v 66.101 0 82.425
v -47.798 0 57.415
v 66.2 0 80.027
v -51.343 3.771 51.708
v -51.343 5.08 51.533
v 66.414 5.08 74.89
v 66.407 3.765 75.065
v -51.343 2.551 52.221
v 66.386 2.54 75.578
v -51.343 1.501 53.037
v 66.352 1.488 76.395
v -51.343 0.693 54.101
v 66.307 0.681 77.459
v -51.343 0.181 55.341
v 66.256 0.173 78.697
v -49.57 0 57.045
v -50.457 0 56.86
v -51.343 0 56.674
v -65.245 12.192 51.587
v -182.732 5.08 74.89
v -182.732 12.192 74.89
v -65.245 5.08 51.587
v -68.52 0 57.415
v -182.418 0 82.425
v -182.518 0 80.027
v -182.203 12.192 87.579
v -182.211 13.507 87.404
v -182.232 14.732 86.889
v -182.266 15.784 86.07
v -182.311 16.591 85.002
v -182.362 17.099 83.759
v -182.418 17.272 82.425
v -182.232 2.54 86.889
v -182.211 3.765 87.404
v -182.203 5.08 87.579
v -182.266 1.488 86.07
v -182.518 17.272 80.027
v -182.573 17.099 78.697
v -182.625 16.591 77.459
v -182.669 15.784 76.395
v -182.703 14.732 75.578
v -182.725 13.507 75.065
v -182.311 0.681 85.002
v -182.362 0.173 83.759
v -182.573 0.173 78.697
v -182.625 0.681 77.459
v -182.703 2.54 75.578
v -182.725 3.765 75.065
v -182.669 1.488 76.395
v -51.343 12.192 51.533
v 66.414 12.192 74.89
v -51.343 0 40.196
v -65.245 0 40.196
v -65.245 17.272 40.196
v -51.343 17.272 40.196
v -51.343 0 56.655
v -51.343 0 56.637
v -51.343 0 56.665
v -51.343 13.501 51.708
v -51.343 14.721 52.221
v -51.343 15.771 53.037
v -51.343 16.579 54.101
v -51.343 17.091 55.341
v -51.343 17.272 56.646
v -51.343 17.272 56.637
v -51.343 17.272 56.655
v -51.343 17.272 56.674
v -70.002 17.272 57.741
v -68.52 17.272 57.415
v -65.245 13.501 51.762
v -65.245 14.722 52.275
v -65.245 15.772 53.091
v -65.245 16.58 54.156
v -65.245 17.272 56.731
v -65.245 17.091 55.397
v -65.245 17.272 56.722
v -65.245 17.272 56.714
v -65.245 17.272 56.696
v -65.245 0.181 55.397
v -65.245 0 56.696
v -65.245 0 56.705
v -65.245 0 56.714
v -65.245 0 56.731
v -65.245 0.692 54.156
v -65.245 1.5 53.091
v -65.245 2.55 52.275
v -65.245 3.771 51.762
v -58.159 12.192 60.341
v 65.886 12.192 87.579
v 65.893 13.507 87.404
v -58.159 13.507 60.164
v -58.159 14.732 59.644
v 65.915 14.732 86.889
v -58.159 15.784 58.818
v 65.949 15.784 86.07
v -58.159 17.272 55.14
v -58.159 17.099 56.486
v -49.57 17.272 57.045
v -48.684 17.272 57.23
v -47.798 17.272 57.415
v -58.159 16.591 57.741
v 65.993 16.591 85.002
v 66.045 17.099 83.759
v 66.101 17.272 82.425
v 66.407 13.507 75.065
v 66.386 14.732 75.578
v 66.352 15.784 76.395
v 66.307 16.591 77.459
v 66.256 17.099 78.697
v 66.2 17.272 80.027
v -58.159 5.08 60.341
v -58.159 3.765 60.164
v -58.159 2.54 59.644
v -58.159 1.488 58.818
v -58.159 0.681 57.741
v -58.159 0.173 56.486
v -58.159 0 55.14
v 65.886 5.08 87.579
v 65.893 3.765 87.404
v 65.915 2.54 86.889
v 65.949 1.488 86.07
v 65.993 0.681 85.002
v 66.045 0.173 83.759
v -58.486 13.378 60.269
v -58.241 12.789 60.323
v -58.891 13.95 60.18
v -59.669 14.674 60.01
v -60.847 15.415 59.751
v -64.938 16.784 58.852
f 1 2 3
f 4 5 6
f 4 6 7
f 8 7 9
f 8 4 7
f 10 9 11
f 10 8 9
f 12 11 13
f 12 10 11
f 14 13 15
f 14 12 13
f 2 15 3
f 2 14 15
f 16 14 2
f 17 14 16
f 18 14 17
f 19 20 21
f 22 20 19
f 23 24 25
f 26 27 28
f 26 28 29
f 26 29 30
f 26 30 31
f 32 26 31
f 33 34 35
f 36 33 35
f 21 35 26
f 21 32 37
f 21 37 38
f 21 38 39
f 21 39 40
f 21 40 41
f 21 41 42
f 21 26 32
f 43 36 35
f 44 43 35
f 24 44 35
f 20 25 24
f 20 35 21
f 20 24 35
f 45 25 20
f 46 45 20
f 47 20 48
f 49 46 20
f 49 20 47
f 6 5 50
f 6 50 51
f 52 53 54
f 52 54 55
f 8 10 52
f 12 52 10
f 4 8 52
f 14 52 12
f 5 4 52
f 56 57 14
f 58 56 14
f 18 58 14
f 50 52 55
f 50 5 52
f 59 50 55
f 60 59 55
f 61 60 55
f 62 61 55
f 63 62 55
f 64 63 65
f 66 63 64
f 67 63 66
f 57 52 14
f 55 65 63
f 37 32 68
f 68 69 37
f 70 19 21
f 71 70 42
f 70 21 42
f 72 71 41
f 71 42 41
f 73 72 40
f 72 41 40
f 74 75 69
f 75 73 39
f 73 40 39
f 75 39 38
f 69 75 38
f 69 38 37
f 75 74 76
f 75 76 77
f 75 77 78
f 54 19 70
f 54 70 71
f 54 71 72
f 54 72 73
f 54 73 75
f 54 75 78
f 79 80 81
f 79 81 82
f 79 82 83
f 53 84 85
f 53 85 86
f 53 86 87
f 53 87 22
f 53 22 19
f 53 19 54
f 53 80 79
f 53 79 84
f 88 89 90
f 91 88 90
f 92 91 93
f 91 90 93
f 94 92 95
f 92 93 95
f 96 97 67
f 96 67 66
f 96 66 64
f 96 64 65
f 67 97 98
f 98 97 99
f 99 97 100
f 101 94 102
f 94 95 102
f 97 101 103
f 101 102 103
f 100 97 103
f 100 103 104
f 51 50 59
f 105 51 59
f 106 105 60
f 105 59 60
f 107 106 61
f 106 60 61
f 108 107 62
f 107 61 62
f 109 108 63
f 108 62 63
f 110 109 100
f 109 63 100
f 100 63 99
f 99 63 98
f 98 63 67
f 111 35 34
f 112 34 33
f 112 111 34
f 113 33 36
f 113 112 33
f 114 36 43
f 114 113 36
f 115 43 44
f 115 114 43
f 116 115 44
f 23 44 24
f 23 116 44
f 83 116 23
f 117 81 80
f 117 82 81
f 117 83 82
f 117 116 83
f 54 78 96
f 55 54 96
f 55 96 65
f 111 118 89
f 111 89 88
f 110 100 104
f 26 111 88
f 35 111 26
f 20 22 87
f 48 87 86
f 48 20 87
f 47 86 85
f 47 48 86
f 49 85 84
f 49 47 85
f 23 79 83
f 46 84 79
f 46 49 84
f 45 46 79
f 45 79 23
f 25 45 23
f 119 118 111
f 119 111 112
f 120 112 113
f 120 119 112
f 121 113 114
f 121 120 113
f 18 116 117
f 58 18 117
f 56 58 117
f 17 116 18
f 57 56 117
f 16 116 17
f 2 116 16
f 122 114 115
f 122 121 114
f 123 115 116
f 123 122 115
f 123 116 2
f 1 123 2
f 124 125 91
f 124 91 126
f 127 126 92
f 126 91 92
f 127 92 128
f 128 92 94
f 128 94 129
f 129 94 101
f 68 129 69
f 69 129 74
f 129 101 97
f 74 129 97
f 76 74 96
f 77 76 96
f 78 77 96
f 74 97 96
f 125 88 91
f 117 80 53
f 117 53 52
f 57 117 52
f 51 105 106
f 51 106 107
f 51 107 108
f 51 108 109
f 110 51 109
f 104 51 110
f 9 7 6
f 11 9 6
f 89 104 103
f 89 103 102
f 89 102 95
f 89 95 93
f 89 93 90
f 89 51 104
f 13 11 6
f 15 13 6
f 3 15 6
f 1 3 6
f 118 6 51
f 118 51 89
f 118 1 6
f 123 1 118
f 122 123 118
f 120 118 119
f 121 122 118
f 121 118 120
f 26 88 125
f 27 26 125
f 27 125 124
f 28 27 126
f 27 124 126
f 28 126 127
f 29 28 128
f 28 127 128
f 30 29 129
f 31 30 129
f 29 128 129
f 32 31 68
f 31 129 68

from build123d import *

# Parameters (mm, degrees)
F1_DEPTH     = 17.272
F2_T4_DEPTH  = 145.1755034497
F2_T9_DEPTH  = 145.1755034497
F2_T14_DEPTH = 145.451805042
F2_T19_DEPTH = 145.451805042
F2_T24_DEPTH = 152.4
F2_T29_DEPTH = 152.4
F2_T34_DEPTH = 152.4
F2_T39_DEPTH = 152.4
F2_T45_DEPTH = 152.4
F2_T49_DEPTH = 152.4
F2_T56_DEPTH = 152.4
F2_T60_DEPTH = 152.4


# Not quite as in the source:
# - a fillet or chamfer that OpenCascade refuses, or shapes differently, is made with other operations: its cross-section is extruded or revolved along the edge and cut away or added


with BuildPart() as f1:
    # F0 (on Front) → F1 (new body)
    with BuildSketch(Plane.XZ):
        Polygon((-58.1587258462, 60.3411067049), (-182.2034080142, 87.5792568958), (-182.731828862, 74.8902549096), (-65.2451664209, 51.5867063582), (-65.2451664209, 57.4221499264), (-51.3433068991, 57.4221499264), (-51.3433068991, 51.5329490591), (66.4143771697, 74.8902549096), (65.8859563219, 87.5792568958), align=None)
        Polygon((-65.2451664209, 57.4221499264), (-65.2451664209, 51.5867063582), (-58.1587258462, 50.1811067049), (-51.3433068991, 51.5329490591), (-51.3433068991, 57.4221499264), align=None)
        Polygon((-58.1587258462, 50.1811067049), (-65.2451664209, 51.5867063582), (-65.2451664209, 40.1959307492), (-51.3433068991, 40.1959307492), (-51.3433068991, 51.5329490591), align=None)
    extrude(amount=-F1_DEPTH)

    # F2: fillet of radius 5.08 on 8 edges, made by hand


with BuildPart() as f2_tool2:
    # F2_s3 → F2_t4 (new body)
    with BuildSketch(Plane(origin=(-202.5642945881, 0, 40.1787468945), x_dir=(0, 1, 0), z_dir=(0.9808905749, 0, -0.1945602221))):
        with BuildLine():
            ThreePointArc((12.192, 37.9067999896), (15.7841024484, 39.3946975412), (17.272, 42.9867999896))
            Line((17.272, 42.9867999896), (17.272, 37.9067999896))
            Line((17.272, 37.9067999896), (12.192, 37.9067999896))
        make_face()
    extrude(amount=F2_T4_DEPTH)

    split(bisect_by=Plane.YZ.offset(-65.2451664209), keep=Keep.BOTTOM)


with BuildPart() as f1_1:
    add(f1.part)

    # F2_t1: cut F2_tool2
    add(f2_tool2.part, mode=Mode.SUBTRACT)


with BuildPart() as f2_tool7:
    # F2_s8 → F2_t9 (new body)
    with BuildSketch(Plane(origin=(-202.5642945881, 0, 40.1787468945), x_dir=(0, 1, 0), z_dir=(0.9808905749, 0, -0.1945602221))):
        with BuildLine():
            ThreePointArc((5.08, 37.9067999896), (1.4878975516, 39.3946975412), (0, 42.9867999896))
            Line((0, 42.9867999896), (0, 37.9067999896))
            Line((0, 37.9067999896), (5.08, 37.9067999896))
        make_face()
    extrude(amount=F2_T9_DEPTH)

    split(bisect_by=Plane.YZ.offset(-65.2451664209), keep=Keep.BOTTOM)


with BuildPart() as f1_2:
    add(f1_1.part)

    # F2_t6: cut F2_tool7
    add(f2_tool7.part, mode=Mode.SUBTRACT)


with BuildPart() as f2_tool12:
    # F2_s13 → F2_t14 (new body)
    with BuildSketch(Plane(origin=(-52.0224181794, 0, -10.3186772236), x_dir=(0, 1, 0), z_dir=(0.9808905749, 0, 0.1945602221))):
        with BuildLine():
            ThreePointArc((12.192, 60.5375492231), (15.7841024484, 62.0254467746), (17.272, 65.6175492231))
            Line((17.272, 65.6175492231), (17.272, 60.5375492231))
            Line((17.272, 60.5375492231), (12.192, 60.5375492231))
        make_face()
    extrude(amount=F2_T14_DEPTH)

    split(bisect_by=Plane.YZ.offset(-51.3433068991), keep=Keep.TOP)


with BuildPart() as f1_3:
    add(f1_2.part)

    # F2_t11: cut F2_tool12
    add(f2_tool12.part, mode=Mode.SUBTRACT)


with BuildPart() as f2_tool17:
    # F2_s18 → F2_t19 (new body)
    with BuildSketch(Plane(origin=(-52.0224181794, 0, -10.3186772236), x_dir=(0, 1, 0), z_dir=(0.9808905749, 0, 0.1945602221))):
        with BuildLine():
            ThreePointArc((5.08, 60.5375492231), (1.4878975516, 62.0254467746), (0, 65.6175492231))
            Line((0, 65.6175492231), (0, 60.5375492231))
            Line((0, 60.5375492231), (5.08, 60.5375492231))
        make_face()
    extrude(amount=F2_T19_DEPTH)

    split(bisect_by=Plane.YZ.offset(-51.3433068991), keep=Keep.TOP)


with BuildPart() as f1_4:
    add(f1_3.part)

    # F2_t16: cut F2_tool17
    add(f2_tool17.part, mode=Mode.SUBTRACT)


with BuildPart() as f2_tool22:
    # F2_s23 → F2_t24 (new body)
    with BuildSketch(Plane(origin=(-55.7194406669, 0, 12.2350629379), x_dir=(0, 1, 0), z_dir=(-0.9767297809, 0, 0.2144736236))):
        with BuildLine():
            ThreePointArc((12.192, -46.4634432549), (15.7841024484, -44.9755457034), (17.272, -41.3834432549))
            Line((17.272, -41.3834432549), (17.272, -46.4634432549))
            Line((17.272, -46.4634432549), (12.192, -46.4634432549))
        make_face()
    extrude(amount=F2_T24_DEPTH)

    split(bisect_by=Plane(origin=(-15.3156619604, 0, 69.7487313476), x_dir=(0, 1, 0), z_dir=(-0.2144736236, 0, 0.9767297809)), keep=Keep.TOP)


with BuildPart() as f1_5:
    add(f1_4.part)

    # F2_t21: cut F2_tool22
    add(f2_tool22.part, mode=Mode.SUBTRACT)


with BuildPart() as f2_tool27:
    # F2_s28 → F2_t29 (new body)
    with BuildSketch(Plane(origin=(-55.7194406669, 0, 12.2350629379), x_dir=(0, 1, 0), z_dir=(-0.9767297809, 0, 0.2144736236))):
        with BuildLine():
            ThreePointArc((5.08, -46.4634432549), (1.4878975516, -44.9755457034), (0, -41.3834432549))
            Line((0, -41.3834432549), (0, -46.4634432549))
            Line((0, -46.4634432549), (5.08, -46.4634432549))
        make_face()
    extrude(amount=F2_T29_DEPTH)

    split(bisect_by=Plane(origin=(-15.3156619604, 0, 69.7487313476), x_dir=(0, 1, 0), z_dir=(-0.2144736236, 0, 0.9767297809)), keep=Keep.TOP)


with BuildPart() as f1_6:
    add(f1_5.part)

    # F2_t26: cut F2_tool27
    add(f2_tool27.part, mode=Mode.SUBTRACT)


with BuildPart() as f2_tool32:
    # F2_s33 → F2_t34 (new body)
    with BuildSketch(Plane(origin=(93.6060864991, 0, 20.5543405673), x_dir=(0, 1, 0), z_dir=(-0.9767297809, 0, -0.2144736236))):
        with BuildLine():
            ThreePointArc((5.08, -71.4104686015), (1.4878975516, -69.92257105), (0, -66.3304686015))
            Line((0, -66.3304686015), (0, -71.4104686015))
            Line((0, -71.4104686015), (5.08, -71.4104686015))
        make_face()
    extrude(amount=F2_T34_DEPTH)

    split(bisect_by=Plane(origin=(9.9651830375, 0, 45.382228748), x_dir=(0, 1, 0), z_dir=(0.2144736236, 0, 0.9767297809)), keep=Keep.TOP)


with BuildPart() as f1_7:
    add(f1_6.part)

    # F2_t31: cut F2_tool32
    add(f2_tool32.part, mode=Mode.SUBTRACT)


with BuildPart() as f2_tool37:
    # F2_s38 → F2_t39 (new body)
    with BuildSketch(Plane(origin=(93.6060864991, 0, 20.5543405673), x_dir=(0, 1, 0), z_dir=(-0.9767297809, 0, -0.2144736236))):
        with BuildLine():
            ThreePointArc((12.192, -71.4104686015), (15.7841024484, -69.92257105), (17.272, -66.3304686015))
            Line((17.272, -66.3304686015), (17.272, -71.4104686015))
            Line((17.272, -71.4104686015), (12.192, -71.4104686015))
        make_face()
    extrude(amount=F2_T39_DEPTH)

    split(bisect_by=Plane(origin=(9.9651830375, 0, 45.382228748), x_dir=(0, 1, 0), z_dir=(0.2144736236, 0, 0.9767297809)), keep=Keep.TOP)


with BuildPart() as f1_8:
    add(f1_7.part)

    # F2_t36: cut F2_tool37
    add(f2_tool37.part, mode=Mode.SUBTRACT)


with BuildPart() as f2_tool43:
    # F2_s44 → F2_t45 (new body)
    with BuildSketch(Plane(origin=(93.6060864991, 0, 20.5543405673), x_dir=(0, 1, 0), z_dir=(-0.9767297809, 0, -0.2144736236))):
        with BuildLine():
            ThreePointArc((12.192, -71.4104686015), (15.7841024484, -69.92257105), (17.272, -66.3304686015))
            Line((17.272, -66.3304686015), (17.272, -71.4104686015))
            Line((17.272, -71.4104686015), (12.192, -71.4104686015))
        make_face()
    extrude(amount=F2_T45_DEPTH)

    split(bisect_by=Plane(origin=(9.9651830375, 0, 45.382228748), x_dir=(0, 1, 0), z_dir=(-0.2144736236, 0, -0.9767297809)), keep=Keep.TOP)


with BuildPart() as f2_tool47:
    # F2_s48 → F2_t49 (new body)
    with BuildSketch(Plane(origin=(-55.7194406669, 0, 12.2350629379), x_dir=(0, 1, 0), z_dir=(-0.9767297809, 0, 0.2144736236))):
        with BuildLine():
            ThreePointArc((12.192, -46.4634432549), (15.7841024484, -44.9755457034), (17.272, -41.3834432549))
            Line((17.272, -41.3834432549), (17.272, -46.4634432549))
            Line((17.272, -46.4634432549), (12.192, -46.4634432549))
        make_face()
    extrude(amount=F2_T49_DEPTH)

    split(bisect_by=Plane(origin=(-15.3156619604, 0, 69.7487313476), x_dir=(0, 1, 0), z_dir=(0.2144736236, 0, -0.9767297809)), keep=Keep.TOP)


with BuildPart() as f2_tool43_1:
    add(f2_tool43.part)

    # F2_t51: intersect F2_tool47
    add(f2_tool47.part, mode=Mode.INTERSECT)


with BuildPart() as f1_9:
    add(f1_8.part)

    # F2_t41: cut F2_tool43
    add(f2_tool43_1.part, mode=Mode.SUBTRACT)


with BuildPart() as f2_tool54:
    # F2_s55 → F2_t56 (new body)
    with BuildSketch(Plane(origin=(93.6060864991, 0, 20.5543405673), x_dir=(0, 1, 0), z_dir=(-0.9767297809, 0, -0.2144736236))):
        with BuildLine():
            ThreePointArc((5.08, -71.4104686015), (1.4878975516, -69.92257105), (0, -66.3304686015))
            Line((0, -66.3304686015), (0, -71.4104686015))
            Line((0, -71.4104686015), (5.08, -71.4104686015))
        make_face()
    extrude(amount=F2_T56_DEPTH)

    split(bisect_by=Plane(origin=(9.9651830375, 0, 45.382228748), x_dir=(0, 1, 0), z_dir=(-0.2144736236, 0, -0.9767297809)), keep=Keep.TOP)


with BuildPart() as f2_tool58:
    # F2_s59 → F2_t60 (new body)
    with BuildSketch(Plane(origin=(-55.7194406669, 0, 12.2350629379), x_dir=(0, 1, 0), z_dir=(-0.9767297809, 0, 0.2144736236))):
        with BuildLine():
            ThreePointArc((5.08, -46.4634432549), (1.4878975516, -44.9755457034), (0, -41.3834432549))
            Line((0, -41.3834432549), (0, -46.4634432549))
            Line((0, -46.4634432549), (5.08, -46.4634432549))
        make_face()
    extrude(amount=F2_T60_DEPTH)

    split(bisect_by=Plane(origin=(-15.3156619604, 0, 69.7487313476), x_dir=(0, 1, 0), z_dir=(0.2144736236, 0, -0.9767297809)), keep=Keep.TOP)


with BuildPart() as f2_tool54_1:
    add(f2_tool54.part)

    # F2_t62: intersect F2_tool58
    add(f2_tool58.part, mode=Mode.INTERSECT)


with BuildPart() as f1_10:
    add(f1_9.part)

    # F2_t52: cut F2_tool54
    add(f2_tool54_1.part, mode=Mode.SUBTRACT)


solid = f1_10.part
